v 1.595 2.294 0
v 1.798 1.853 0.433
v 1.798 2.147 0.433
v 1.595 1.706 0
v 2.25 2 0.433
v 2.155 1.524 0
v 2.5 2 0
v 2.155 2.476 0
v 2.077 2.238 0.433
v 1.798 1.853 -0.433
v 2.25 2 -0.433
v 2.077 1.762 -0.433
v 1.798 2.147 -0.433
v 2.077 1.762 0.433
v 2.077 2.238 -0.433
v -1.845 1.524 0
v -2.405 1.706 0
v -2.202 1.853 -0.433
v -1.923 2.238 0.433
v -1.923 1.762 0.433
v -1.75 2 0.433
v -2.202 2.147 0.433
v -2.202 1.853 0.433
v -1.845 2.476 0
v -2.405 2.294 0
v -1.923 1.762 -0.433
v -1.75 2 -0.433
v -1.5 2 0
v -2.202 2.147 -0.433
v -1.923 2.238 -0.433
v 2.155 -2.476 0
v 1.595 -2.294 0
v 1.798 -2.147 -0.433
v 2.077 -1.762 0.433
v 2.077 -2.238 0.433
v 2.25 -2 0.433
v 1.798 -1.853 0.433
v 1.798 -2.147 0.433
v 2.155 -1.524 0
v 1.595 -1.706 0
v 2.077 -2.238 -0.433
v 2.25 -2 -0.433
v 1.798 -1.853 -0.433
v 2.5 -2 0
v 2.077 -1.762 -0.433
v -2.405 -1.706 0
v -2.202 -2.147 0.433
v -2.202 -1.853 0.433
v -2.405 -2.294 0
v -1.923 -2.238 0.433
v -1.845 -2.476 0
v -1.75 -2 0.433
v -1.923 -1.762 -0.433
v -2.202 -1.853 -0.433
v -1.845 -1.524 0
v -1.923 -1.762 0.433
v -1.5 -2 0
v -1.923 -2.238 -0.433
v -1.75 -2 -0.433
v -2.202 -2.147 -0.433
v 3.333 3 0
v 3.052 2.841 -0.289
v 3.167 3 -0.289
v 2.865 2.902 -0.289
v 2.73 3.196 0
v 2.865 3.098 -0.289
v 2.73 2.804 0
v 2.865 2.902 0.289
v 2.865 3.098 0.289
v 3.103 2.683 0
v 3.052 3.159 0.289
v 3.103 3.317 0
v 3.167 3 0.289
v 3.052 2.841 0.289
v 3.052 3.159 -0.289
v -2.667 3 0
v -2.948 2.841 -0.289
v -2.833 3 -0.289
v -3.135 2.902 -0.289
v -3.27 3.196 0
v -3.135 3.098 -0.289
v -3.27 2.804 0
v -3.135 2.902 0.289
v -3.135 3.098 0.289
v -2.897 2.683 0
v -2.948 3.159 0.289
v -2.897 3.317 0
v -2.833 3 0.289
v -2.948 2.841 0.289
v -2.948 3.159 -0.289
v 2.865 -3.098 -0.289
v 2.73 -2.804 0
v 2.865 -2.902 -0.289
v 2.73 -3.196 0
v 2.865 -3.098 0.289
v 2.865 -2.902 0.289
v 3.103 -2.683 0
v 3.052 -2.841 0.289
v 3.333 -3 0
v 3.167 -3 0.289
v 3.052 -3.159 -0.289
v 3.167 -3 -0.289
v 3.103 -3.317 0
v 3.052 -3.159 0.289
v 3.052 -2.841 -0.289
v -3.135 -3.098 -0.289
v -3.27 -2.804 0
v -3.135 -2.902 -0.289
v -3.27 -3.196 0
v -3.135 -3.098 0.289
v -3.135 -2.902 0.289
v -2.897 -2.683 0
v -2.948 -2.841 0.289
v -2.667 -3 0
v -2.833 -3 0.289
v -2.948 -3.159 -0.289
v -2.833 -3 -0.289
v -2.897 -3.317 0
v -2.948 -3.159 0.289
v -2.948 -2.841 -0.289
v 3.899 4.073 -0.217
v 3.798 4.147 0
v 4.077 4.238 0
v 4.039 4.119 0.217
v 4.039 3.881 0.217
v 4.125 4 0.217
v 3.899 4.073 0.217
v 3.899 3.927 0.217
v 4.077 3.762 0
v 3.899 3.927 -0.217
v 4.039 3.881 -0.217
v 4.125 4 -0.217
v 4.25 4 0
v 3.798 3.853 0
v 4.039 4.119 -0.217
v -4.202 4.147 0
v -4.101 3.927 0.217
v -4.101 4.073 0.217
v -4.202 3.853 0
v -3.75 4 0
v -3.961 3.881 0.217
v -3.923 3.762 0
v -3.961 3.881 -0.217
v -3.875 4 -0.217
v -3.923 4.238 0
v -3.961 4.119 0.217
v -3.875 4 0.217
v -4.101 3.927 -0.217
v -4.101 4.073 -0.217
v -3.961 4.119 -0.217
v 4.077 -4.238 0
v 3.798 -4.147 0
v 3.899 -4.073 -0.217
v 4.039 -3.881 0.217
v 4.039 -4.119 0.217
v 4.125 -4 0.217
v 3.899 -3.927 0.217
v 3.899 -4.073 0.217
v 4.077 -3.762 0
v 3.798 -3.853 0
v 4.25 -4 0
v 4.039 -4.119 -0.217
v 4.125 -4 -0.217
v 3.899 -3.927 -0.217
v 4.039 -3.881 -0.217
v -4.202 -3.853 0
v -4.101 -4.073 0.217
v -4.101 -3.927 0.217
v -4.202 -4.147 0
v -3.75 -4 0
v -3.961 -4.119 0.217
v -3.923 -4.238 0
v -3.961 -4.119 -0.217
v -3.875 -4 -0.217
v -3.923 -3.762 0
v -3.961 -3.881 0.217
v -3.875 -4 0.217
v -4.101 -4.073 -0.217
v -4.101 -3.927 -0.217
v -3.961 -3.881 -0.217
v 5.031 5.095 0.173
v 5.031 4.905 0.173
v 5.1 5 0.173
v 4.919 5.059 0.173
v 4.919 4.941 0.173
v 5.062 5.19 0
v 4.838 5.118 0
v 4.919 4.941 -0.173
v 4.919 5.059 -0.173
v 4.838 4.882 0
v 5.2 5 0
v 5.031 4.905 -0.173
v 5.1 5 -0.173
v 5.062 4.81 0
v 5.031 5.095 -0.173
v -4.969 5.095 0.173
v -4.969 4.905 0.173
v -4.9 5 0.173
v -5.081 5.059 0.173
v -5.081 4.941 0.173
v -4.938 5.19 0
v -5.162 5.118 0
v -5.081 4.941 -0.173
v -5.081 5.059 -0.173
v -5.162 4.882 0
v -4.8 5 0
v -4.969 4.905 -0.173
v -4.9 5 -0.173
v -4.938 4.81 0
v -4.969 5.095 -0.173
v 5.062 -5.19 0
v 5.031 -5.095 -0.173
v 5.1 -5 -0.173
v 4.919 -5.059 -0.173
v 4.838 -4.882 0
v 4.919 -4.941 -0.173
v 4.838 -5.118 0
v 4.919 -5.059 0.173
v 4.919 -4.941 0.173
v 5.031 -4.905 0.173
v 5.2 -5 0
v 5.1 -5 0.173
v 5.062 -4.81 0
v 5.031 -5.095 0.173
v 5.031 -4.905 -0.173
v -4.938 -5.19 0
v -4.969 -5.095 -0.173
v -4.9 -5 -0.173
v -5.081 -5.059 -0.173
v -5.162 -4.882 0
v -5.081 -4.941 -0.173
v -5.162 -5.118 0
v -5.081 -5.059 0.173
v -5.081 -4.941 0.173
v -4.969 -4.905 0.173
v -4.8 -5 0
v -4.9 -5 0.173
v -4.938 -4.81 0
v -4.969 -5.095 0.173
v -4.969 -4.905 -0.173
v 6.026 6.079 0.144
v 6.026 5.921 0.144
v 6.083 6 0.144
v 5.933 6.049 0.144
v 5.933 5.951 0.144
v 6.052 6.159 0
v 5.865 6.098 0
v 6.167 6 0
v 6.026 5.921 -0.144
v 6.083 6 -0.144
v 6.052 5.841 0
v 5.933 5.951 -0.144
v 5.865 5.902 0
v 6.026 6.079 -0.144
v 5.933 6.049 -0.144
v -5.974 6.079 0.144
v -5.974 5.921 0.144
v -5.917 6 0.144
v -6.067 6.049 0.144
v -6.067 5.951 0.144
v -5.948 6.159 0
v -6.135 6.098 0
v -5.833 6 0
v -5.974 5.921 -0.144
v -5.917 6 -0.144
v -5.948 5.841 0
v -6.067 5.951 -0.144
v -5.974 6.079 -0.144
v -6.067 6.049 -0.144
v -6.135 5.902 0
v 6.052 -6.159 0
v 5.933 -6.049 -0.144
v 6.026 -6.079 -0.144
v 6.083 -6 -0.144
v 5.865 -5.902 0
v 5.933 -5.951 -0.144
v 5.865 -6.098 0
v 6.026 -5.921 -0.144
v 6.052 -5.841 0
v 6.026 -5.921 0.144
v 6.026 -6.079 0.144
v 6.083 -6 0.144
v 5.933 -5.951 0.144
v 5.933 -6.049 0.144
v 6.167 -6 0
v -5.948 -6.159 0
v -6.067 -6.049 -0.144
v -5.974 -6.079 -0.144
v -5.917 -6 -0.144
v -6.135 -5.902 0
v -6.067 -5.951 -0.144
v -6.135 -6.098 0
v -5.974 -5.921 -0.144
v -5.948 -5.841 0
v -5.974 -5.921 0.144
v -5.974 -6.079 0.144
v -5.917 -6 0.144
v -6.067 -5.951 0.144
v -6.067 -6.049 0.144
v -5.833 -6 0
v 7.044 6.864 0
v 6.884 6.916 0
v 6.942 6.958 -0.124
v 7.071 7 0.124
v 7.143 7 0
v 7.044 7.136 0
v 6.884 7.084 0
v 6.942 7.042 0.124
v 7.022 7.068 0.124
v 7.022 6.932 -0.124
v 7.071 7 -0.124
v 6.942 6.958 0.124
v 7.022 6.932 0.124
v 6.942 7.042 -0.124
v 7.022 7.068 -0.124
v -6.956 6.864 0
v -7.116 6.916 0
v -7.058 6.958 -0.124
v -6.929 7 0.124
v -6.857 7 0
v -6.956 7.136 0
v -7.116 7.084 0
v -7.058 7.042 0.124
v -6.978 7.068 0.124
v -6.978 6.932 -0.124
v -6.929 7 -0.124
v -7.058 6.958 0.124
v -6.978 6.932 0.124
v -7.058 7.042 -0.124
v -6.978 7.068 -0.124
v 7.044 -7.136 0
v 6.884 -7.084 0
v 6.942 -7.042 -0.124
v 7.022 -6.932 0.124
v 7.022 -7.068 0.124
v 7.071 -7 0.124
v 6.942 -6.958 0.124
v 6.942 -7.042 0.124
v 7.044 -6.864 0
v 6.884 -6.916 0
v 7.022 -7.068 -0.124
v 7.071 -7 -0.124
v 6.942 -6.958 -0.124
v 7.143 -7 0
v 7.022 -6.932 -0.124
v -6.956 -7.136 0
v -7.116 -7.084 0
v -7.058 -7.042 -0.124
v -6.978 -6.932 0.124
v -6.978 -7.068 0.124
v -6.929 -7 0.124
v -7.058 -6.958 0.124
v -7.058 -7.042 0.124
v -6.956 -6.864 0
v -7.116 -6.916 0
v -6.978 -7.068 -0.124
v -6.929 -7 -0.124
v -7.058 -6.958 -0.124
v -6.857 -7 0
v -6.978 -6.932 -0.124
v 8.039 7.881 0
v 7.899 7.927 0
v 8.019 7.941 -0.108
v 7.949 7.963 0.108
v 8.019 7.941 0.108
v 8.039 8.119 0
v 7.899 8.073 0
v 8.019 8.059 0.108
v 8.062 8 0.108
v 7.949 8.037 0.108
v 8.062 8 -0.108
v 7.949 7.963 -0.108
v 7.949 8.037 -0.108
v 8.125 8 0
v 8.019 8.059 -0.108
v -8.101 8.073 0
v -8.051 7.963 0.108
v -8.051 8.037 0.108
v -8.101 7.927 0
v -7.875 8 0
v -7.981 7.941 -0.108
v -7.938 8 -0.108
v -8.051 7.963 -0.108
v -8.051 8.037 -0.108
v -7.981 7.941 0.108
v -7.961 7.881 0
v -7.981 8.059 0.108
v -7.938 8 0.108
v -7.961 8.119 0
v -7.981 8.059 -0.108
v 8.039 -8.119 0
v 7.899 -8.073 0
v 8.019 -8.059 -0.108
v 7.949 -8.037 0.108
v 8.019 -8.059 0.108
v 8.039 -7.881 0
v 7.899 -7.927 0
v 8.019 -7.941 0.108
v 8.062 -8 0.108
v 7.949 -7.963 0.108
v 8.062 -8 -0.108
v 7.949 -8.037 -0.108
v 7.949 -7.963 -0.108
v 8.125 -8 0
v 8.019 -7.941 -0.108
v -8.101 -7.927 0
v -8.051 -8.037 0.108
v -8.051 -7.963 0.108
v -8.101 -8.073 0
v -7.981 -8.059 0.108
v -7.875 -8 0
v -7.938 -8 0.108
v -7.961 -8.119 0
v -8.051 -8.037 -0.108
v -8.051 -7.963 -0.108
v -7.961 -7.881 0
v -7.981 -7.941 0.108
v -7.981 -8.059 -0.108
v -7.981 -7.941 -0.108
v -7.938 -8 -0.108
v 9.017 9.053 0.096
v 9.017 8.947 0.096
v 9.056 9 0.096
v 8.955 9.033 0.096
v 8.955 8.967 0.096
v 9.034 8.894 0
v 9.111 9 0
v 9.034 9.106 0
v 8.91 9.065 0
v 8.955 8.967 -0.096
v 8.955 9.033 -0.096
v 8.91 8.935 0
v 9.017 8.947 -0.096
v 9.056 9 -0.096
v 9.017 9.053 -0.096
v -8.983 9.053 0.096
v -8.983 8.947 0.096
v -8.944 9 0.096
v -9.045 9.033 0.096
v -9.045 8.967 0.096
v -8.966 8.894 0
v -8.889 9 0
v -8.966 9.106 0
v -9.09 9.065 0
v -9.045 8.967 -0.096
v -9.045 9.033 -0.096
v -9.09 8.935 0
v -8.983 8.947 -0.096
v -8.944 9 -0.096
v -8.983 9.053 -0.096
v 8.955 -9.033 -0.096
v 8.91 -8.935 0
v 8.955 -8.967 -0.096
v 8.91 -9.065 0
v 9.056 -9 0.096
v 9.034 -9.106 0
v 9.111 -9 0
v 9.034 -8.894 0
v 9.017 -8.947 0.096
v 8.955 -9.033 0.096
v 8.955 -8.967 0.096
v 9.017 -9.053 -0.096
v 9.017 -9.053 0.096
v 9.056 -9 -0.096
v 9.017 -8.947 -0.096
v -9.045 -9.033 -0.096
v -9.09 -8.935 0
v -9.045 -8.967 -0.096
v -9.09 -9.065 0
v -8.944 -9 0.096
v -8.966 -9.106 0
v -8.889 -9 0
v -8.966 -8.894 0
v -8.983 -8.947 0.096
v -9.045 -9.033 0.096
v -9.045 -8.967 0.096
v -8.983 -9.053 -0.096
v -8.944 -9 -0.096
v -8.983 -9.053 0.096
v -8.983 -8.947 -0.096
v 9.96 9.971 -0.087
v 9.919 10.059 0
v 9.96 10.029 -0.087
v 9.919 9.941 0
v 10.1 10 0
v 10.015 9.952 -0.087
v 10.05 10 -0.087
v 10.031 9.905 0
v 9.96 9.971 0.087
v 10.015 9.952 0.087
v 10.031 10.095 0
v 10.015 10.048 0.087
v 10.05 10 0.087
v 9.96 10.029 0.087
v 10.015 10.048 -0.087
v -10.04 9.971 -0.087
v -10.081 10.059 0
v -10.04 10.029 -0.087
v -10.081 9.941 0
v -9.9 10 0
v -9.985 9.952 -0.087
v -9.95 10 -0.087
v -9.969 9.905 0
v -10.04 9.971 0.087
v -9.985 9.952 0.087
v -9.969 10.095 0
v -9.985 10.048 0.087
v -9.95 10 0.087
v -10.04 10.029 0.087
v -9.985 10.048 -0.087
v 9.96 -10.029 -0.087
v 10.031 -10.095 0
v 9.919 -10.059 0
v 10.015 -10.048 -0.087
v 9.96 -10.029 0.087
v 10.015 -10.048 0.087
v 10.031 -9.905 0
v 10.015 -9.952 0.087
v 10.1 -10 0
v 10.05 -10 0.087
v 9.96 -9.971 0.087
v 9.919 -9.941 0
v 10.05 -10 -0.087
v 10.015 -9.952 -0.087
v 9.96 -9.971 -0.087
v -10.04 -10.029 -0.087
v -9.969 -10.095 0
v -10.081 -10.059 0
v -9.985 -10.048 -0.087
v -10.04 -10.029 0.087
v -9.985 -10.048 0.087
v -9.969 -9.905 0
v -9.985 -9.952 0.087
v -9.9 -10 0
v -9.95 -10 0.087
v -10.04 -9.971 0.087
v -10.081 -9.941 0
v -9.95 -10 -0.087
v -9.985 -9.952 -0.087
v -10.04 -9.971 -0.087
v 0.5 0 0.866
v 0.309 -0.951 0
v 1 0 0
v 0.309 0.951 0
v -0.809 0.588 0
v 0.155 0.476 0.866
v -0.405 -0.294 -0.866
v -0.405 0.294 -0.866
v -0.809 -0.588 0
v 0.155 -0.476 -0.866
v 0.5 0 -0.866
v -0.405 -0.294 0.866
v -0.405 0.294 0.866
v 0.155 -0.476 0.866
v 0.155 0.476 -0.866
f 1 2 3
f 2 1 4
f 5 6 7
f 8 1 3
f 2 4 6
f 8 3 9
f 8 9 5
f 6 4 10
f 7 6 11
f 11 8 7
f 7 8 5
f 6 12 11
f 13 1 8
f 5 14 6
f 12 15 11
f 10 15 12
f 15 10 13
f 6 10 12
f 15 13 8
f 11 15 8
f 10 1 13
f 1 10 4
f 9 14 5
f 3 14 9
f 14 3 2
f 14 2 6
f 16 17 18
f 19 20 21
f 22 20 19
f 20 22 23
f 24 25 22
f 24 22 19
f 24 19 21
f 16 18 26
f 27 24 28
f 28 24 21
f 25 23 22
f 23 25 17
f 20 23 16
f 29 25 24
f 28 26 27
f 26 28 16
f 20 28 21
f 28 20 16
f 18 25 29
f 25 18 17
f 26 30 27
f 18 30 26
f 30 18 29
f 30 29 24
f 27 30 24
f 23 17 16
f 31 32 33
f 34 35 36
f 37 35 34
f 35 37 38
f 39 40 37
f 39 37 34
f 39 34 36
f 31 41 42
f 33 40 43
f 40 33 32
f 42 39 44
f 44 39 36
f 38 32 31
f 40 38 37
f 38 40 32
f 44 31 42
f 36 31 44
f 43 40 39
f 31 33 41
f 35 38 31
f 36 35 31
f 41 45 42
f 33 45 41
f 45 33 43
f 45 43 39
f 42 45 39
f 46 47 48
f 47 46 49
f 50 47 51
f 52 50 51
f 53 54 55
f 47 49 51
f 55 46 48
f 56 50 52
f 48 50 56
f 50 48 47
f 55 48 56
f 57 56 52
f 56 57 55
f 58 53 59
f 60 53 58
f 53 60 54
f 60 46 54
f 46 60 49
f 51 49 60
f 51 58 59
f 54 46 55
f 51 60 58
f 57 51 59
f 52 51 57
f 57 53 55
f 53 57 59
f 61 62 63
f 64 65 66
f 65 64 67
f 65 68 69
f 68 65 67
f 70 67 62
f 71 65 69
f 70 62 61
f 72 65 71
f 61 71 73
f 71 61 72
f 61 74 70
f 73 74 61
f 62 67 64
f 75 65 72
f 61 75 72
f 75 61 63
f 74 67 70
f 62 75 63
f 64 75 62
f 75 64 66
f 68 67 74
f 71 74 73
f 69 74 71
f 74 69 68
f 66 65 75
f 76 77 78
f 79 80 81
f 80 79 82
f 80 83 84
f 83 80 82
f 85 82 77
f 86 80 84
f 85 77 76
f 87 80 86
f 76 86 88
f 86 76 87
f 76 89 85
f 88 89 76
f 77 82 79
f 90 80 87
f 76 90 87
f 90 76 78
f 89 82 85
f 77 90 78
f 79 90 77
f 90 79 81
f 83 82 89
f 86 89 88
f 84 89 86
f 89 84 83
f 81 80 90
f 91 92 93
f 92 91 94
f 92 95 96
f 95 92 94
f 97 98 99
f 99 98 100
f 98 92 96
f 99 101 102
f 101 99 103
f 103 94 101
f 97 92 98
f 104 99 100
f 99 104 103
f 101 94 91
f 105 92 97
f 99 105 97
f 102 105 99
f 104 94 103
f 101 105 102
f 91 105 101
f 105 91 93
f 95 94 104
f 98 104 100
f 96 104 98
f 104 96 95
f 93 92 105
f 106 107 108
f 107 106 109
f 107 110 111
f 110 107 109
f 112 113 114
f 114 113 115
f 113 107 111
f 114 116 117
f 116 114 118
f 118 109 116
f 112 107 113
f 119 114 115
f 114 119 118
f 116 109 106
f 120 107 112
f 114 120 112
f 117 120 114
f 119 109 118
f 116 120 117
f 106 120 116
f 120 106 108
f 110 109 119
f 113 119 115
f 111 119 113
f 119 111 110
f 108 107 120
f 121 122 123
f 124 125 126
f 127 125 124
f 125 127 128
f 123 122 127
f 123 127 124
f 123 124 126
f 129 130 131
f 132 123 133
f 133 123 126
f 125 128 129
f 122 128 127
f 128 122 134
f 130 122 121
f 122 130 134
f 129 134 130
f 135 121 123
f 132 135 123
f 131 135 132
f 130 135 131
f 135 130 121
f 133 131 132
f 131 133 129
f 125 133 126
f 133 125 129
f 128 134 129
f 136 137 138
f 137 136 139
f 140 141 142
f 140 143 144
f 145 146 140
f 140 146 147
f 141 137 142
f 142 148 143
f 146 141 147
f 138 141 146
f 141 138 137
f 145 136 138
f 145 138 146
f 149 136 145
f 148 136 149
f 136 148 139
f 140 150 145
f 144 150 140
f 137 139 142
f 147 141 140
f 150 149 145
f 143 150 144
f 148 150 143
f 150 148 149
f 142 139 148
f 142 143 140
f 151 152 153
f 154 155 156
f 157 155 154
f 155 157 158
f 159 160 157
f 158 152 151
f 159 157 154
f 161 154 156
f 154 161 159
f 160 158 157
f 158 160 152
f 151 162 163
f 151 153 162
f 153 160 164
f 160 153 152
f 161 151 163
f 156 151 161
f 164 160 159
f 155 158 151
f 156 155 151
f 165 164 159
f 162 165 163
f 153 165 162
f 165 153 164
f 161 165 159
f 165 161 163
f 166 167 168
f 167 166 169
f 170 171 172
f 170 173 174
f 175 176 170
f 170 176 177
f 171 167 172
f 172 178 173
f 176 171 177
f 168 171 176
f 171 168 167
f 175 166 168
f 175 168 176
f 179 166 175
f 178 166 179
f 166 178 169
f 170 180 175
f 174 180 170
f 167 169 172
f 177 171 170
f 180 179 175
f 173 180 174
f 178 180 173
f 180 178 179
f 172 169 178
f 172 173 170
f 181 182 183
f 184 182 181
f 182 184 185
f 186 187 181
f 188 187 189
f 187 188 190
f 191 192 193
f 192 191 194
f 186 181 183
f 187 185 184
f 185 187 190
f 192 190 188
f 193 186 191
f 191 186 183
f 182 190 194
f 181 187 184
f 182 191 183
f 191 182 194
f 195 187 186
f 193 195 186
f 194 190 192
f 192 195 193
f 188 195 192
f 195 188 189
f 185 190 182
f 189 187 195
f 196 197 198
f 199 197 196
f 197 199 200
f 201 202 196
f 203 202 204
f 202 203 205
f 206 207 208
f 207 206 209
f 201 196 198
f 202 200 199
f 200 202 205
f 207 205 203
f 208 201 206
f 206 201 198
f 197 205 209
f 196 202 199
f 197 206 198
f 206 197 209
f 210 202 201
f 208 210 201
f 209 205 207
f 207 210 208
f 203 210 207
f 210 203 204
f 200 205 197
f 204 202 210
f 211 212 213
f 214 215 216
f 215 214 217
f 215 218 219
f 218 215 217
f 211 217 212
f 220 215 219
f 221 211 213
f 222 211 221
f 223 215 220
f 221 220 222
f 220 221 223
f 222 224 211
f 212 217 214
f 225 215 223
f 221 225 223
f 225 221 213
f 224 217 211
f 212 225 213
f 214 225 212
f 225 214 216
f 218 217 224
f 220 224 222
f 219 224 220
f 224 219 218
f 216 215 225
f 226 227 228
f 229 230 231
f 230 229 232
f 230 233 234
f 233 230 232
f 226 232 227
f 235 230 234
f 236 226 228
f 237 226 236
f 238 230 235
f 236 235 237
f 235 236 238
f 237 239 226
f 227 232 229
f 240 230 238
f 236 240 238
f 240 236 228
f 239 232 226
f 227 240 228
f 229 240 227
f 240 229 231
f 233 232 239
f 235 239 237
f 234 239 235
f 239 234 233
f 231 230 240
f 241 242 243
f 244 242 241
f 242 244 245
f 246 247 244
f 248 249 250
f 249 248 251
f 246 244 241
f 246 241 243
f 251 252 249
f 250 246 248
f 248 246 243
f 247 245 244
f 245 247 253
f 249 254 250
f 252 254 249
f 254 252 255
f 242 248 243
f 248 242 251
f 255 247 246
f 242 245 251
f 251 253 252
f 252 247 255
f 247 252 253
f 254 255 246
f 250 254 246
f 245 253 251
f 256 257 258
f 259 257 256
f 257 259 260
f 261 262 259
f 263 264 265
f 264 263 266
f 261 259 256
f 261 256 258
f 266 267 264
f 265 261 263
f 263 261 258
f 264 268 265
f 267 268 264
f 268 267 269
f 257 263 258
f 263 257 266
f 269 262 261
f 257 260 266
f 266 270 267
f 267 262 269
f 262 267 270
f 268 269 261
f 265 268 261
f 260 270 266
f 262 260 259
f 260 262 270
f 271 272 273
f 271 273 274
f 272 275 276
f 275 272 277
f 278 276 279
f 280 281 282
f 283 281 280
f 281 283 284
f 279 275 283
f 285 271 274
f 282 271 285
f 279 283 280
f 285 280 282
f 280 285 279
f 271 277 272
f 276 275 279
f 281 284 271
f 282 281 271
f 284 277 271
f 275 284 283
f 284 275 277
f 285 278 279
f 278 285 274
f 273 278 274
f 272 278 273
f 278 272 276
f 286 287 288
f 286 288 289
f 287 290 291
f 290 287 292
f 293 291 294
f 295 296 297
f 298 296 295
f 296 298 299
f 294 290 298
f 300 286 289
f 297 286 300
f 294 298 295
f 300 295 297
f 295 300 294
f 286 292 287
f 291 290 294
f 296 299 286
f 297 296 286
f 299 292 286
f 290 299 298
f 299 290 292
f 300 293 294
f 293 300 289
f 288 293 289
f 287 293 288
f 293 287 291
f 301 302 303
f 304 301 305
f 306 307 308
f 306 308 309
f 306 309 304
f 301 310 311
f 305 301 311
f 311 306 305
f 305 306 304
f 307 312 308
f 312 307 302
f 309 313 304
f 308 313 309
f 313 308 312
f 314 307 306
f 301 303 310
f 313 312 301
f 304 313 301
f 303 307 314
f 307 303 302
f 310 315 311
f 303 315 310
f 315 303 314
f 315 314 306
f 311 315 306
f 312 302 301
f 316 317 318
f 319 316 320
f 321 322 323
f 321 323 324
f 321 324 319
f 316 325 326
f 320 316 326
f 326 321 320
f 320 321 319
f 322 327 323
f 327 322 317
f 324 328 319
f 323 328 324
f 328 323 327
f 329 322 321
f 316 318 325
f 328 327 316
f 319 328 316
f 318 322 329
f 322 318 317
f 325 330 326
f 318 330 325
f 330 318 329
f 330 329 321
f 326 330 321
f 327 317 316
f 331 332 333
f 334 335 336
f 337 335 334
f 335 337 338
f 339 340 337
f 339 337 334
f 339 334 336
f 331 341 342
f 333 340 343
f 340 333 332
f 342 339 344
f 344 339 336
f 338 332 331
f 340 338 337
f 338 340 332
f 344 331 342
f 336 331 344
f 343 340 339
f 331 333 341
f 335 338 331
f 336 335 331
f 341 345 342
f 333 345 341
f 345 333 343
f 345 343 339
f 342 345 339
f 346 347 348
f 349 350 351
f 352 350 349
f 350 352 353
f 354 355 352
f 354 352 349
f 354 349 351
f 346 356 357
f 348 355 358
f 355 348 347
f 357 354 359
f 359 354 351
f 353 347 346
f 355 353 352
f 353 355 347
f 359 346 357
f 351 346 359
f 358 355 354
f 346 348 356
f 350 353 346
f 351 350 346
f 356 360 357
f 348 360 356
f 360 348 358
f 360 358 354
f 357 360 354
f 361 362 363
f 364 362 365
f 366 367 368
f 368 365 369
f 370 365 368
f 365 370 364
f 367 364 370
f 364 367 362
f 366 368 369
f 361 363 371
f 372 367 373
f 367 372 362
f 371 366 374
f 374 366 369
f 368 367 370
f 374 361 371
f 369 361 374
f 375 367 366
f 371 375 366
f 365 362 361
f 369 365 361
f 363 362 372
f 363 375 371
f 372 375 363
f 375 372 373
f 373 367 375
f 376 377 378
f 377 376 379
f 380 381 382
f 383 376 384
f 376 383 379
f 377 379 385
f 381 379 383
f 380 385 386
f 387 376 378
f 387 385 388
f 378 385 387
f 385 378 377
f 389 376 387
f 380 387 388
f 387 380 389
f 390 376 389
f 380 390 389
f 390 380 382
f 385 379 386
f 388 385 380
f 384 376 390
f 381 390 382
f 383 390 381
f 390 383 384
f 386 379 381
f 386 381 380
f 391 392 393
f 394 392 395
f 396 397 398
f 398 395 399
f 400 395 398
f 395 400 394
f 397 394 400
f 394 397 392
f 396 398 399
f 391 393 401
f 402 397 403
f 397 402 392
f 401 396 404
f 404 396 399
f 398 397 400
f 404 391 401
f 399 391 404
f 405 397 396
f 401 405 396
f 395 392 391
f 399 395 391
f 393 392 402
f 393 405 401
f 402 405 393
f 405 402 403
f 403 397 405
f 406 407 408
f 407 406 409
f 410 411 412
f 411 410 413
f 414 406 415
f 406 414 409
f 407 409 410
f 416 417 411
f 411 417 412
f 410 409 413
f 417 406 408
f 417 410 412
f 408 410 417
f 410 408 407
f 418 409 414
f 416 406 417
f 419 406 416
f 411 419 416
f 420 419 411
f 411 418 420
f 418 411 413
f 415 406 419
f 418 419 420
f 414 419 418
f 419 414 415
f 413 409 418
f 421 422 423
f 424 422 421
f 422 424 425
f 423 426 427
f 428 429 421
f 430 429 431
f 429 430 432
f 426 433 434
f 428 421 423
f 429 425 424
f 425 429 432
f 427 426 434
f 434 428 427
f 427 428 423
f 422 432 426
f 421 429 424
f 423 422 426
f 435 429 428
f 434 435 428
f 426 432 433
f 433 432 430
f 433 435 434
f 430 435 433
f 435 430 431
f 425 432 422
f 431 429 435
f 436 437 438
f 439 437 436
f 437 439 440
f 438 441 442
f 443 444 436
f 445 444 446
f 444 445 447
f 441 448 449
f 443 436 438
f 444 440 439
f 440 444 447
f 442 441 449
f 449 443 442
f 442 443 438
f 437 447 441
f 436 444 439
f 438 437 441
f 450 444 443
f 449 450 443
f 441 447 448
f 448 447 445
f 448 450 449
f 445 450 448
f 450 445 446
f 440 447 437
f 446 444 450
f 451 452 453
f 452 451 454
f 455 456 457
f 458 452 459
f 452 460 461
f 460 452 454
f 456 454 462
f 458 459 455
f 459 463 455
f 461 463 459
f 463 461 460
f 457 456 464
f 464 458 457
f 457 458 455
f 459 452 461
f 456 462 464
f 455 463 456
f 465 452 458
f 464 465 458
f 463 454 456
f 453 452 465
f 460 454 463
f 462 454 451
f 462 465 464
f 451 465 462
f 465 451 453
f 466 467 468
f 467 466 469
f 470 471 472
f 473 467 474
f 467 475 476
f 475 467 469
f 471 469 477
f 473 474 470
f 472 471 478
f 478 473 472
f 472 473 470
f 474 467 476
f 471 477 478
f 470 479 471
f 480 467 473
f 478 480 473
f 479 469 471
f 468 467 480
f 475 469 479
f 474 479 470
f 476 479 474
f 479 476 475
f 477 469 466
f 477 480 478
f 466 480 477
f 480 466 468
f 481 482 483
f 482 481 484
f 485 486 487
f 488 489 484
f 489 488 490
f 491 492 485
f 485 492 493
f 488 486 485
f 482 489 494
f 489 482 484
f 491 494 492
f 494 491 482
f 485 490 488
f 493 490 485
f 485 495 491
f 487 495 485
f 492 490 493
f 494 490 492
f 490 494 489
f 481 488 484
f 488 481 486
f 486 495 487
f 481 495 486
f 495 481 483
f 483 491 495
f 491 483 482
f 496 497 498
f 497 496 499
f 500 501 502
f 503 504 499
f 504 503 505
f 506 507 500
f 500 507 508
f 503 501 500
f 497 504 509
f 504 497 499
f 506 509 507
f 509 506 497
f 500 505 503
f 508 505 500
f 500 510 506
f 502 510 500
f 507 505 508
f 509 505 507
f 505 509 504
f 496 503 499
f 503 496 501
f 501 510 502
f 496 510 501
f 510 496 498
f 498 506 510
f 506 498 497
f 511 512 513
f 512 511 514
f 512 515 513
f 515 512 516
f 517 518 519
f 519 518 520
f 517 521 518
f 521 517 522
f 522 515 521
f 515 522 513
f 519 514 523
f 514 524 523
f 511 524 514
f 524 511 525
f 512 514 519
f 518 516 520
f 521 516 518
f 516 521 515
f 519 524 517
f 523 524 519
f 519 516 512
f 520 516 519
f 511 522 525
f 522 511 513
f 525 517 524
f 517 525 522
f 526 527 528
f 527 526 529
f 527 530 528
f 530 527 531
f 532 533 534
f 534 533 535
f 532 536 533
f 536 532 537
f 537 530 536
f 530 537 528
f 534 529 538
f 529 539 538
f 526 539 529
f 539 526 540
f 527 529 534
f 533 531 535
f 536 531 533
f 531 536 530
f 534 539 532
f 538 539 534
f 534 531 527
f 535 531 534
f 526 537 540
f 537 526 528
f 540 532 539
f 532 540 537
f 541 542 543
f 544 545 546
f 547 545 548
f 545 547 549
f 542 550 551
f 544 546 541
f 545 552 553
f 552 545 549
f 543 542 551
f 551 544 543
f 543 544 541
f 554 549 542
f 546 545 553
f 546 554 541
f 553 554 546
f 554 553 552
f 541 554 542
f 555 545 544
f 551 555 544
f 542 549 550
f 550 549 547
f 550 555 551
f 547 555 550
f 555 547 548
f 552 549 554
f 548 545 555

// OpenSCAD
sphere(1);

module translated_sphere(radius, x, y) {
    translate([x, y, 0]) {
        sphere(radius);
    }
}

for (index = [2:1:10]) {
    translated_sphere(1/index, index, index);
    translated_sphere(1/index, -index, index);
    translated_sphere(1/index, index, -index);
    translated_sphere(1/index, -index, -index);
        
}
